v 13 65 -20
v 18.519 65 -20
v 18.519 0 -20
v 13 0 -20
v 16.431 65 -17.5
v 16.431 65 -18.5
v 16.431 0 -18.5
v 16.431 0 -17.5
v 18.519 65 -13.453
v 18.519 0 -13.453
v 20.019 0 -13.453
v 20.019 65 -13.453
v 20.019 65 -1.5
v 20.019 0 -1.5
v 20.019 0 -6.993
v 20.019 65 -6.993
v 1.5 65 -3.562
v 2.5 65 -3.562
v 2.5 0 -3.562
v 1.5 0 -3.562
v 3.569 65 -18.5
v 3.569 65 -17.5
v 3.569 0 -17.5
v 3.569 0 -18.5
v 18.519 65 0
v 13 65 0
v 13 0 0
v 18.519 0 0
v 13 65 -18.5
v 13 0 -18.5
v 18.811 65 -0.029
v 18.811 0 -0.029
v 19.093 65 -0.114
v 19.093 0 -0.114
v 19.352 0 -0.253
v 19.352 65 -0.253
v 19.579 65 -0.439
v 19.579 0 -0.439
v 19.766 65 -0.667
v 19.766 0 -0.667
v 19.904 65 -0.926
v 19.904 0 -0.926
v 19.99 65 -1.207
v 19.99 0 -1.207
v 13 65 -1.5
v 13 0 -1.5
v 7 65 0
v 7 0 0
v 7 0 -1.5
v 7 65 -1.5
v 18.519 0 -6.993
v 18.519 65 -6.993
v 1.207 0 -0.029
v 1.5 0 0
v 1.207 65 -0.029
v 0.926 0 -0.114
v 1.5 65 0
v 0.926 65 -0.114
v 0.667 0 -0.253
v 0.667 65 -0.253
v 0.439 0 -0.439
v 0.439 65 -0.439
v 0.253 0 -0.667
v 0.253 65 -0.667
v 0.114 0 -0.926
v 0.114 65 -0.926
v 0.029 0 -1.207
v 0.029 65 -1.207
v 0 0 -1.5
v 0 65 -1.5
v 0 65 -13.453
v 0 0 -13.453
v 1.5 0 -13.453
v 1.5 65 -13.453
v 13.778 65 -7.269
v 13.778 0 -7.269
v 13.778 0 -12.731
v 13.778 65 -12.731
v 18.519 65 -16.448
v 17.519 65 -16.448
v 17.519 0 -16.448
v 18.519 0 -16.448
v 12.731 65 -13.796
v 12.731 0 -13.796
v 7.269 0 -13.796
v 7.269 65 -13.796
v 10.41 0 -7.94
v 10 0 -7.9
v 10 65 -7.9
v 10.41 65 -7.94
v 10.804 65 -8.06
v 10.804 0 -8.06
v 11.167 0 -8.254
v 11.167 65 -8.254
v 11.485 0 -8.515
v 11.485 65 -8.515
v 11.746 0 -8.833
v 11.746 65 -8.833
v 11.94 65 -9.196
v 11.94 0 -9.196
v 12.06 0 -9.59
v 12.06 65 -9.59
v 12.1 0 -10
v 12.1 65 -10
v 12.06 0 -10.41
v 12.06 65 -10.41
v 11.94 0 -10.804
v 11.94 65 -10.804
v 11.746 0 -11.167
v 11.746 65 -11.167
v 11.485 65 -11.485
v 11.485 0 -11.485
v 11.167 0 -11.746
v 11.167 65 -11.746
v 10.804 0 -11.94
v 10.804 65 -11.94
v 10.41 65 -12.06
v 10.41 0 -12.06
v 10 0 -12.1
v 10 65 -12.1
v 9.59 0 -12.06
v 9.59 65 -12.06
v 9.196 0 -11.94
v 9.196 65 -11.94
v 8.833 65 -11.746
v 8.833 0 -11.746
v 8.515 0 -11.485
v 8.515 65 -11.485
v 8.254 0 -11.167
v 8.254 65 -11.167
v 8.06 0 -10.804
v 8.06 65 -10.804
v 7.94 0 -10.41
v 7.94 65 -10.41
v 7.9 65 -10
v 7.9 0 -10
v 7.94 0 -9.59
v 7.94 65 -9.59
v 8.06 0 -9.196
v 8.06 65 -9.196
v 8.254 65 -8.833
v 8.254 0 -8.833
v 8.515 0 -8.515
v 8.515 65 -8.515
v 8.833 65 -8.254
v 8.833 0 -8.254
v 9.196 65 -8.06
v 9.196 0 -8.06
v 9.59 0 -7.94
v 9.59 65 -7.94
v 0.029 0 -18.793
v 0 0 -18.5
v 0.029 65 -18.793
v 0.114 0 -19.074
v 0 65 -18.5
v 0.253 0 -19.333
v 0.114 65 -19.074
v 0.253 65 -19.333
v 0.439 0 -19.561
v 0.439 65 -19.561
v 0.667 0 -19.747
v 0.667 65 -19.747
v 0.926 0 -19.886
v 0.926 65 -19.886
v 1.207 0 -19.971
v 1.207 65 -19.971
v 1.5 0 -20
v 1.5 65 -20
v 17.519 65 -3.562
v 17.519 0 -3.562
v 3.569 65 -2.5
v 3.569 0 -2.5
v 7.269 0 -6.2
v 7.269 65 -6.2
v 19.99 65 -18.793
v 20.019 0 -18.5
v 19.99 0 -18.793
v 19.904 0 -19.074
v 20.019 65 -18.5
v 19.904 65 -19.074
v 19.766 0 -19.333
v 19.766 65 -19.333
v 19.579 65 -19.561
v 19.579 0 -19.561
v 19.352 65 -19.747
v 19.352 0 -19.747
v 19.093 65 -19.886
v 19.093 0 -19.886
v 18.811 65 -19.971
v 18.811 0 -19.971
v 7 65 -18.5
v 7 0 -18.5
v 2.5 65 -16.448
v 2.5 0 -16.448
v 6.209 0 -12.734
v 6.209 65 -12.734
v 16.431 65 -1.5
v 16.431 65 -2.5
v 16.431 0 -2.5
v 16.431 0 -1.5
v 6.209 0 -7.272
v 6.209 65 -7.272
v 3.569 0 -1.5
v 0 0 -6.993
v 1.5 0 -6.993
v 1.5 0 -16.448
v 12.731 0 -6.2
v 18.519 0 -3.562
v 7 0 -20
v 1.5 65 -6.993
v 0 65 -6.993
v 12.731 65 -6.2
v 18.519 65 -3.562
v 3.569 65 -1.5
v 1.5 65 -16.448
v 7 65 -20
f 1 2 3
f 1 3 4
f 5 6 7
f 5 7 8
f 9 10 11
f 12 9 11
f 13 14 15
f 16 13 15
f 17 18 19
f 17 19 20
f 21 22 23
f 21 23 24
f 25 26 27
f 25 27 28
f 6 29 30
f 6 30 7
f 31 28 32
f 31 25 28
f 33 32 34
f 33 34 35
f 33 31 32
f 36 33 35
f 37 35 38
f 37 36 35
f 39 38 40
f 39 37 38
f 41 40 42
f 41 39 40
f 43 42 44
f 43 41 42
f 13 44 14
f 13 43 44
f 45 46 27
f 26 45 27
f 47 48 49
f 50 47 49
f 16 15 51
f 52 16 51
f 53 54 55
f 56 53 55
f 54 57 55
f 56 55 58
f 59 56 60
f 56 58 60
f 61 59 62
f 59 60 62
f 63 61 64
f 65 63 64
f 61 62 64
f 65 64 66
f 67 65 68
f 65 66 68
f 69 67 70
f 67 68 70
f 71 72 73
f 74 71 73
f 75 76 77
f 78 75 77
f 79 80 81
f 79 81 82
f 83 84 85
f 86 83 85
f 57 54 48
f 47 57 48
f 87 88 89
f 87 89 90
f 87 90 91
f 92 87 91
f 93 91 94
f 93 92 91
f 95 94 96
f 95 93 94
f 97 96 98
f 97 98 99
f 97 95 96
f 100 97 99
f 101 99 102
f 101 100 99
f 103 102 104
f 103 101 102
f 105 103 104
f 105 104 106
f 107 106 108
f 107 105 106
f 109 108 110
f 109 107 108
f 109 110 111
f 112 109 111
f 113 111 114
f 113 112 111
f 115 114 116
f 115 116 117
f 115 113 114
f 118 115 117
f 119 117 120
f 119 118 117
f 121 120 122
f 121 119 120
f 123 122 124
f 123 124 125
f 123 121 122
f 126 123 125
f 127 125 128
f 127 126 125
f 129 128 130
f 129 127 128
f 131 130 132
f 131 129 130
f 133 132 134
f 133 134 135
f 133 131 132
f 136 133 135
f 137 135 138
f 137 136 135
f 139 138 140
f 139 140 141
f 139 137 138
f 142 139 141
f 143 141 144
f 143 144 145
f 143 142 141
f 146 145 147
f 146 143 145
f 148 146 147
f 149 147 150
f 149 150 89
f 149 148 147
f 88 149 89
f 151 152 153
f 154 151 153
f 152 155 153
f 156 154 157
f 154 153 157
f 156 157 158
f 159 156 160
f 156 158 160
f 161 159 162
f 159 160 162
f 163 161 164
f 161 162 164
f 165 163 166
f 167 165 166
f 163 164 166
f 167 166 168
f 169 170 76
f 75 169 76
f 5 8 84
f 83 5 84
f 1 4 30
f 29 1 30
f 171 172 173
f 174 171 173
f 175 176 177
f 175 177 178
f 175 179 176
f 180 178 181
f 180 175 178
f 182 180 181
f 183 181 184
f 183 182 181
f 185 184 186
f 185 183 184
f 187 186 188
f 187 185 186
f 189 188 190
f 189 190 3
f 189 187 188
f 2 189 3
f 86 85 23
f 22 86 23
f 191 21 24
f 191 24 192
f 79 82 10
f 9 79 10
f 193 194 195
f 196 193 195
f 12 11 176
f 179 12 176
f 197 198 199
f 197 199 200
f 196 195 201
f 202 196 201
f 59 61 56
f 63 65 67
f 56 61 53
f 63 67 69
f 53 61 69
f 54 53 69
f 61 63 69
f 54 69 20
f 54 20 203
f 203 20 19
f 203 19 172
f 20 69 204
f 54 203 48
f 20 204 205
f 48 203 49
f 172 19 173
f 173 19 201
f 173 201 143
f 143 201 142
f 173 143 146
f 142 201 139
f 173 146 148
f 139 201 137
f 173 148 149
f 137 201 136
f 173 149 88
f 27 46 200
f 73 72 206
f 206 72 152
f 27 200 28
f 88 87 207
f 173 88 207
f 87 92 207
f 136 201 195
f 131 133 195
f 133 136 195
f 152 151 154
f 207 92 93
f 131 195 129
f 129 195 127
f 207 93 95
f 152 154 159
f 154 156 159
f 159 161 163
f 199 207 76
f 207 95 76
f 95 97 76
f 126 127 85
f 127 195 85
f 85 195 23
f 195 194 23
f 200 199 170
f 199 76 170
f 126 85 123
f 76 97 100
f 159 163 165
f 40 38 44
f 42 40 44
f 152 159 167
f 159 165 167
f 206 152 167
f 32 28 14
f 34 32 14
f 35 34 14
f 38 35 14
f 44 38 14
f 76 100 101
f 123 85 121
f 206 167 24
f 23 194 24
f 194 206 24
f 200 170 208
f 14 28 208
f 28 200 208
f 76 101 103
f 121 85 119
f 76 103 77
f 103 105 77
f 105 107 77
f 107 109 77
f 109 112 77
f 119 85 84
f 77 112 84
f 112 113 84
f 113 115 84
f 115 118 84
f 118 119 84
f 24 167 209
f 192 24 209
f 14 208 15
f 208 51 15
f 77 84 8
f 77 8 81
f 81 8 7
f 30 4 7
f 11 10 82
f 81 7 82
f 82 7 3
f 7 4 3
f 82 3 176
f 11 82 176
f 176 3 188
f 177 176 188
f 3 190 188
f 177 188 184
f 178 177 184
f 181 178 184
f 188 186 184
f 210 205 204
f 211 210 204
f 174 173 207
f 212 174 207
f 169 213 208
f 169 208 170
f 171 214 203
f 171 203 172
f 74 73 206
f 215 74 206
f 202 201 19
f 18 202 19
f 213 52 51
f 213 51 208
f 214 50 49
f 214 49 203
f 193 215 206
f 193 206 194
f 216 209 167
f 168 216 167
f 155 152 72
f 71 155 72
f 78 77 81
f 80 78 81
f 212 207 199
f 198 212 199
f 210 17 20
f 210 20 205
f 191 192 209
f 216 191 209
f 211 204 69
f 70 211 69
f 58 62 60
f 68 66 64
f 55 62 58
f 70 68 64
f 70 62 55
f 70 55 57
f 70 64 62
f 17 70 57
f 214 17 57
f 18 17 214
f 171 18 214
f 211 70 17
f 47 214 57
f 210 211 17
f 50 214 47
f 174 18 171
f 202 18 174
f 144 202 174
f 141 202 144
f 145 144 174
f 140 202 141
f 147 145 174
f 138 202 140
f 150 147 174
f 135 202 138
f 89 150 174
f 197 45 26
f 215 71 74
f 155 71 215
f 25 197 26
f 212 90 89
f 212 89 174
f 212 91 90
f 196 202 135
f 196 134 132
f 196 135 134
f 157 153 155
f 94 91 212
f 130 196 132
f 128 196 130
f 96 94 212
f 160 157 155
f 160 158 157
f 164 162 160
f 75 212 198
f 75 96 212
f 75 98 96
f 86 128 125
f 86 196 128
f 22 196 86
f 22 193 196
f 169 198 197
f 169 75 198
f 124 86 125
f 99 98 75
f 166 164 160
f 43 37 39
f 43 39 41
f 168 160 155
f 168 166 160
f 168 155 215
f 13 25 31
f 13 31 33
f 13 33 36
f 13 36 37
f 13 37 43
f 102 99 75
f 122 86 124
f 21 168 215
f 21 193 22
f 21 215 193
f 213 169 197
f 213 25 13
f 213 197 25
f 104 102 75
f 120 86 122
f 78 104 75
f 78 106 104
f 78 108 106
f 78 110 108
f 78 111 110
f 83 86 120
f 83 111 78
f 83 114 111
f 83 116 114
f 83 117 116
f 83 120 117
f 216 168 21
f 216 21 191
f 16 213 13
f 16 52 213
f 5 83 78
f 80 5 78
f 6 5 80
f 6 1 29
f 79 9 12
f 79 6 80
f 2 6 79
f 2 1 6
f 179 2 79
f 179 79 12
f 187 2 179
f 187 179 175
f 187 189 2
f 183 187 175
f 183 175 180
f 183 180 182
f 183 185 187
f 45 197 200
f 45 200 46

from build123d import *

# Parameters (mm, degrees)
SKETCH1_R           = 2.1
BOSS_EXTRUDE1_DEPTH = 65
FILLET1_R           = 1.5


with BuildPart() as part:
    # Sketch1 → Boss-Extrude1 (new body)
    with BuildSketch(Plane(origin=(0, 0, 0), x_dir=(1, 0, 0), z_dir=(0, 1, 0))):
        Polygon((0, 0), (7, 0), (7, 1.5), (3.56901309, 1.5), (3.56901309, 2.5), (7.26901309, 6.2), (12.73098691, 6.2), (16.43098691, 2.5), (16.43098691, 1.5), (13, 1.5), (13, 0), (20.018554527, 0), (20.018554527, 6.993482935), (18.518554527, 6.993482935), (18.518554527, 3.562496025), (17.518554527, 3.562496025), (13.777987766, 7.26901309), (13.777987766, 12.73098691), (17.518554527, 16.447701982), (18.518554527, 16.447701982), (18.518554527, 13.45318801), (20.018554527, 13.45318801), (20.018554527, 20), (13, 20), (13, 18.5), (16.43098691, 18.5), (16.43098691, 17.5), (12.73098691, 13.795754461), (7.26901309, 13.795754461), (3.56901309, 17.5), (3.56901309, 18.5), (7, 18.5), (7, 20), (0, 20), (0, 13.45318801), (1.5, 13.45318801), (1.5, 16.447701982), (2.5, 16.447701982), (6.209487856, 12.733957701), (6.209487856, 7.271983881), (2.5, 3.562496025), (1.5, 3.562496025), (1.5, 6.993482935), (0, 6.993482935), align=None)
        with Locations(Location((10, 10, 0), (0, 0, 270))):
            Circle(SKETCH1_R, mode=Mode.SUBTRACT)
    extrude(amount=BOSS_EXTRUDE1_DEPTH)

    # Fillet1
    fillet1_edges = [part.edges().sort_by_distance(p)[0] for p in [
        (0, 32.5, -20),
        (20.018554527, 32.5, -20),
        (20.018554527, 32.5, 0),
        (0, 32.5, 0),
    ]]
    fillet(fillet1_edges, radius=FILLET1_R)


solid = part.part
